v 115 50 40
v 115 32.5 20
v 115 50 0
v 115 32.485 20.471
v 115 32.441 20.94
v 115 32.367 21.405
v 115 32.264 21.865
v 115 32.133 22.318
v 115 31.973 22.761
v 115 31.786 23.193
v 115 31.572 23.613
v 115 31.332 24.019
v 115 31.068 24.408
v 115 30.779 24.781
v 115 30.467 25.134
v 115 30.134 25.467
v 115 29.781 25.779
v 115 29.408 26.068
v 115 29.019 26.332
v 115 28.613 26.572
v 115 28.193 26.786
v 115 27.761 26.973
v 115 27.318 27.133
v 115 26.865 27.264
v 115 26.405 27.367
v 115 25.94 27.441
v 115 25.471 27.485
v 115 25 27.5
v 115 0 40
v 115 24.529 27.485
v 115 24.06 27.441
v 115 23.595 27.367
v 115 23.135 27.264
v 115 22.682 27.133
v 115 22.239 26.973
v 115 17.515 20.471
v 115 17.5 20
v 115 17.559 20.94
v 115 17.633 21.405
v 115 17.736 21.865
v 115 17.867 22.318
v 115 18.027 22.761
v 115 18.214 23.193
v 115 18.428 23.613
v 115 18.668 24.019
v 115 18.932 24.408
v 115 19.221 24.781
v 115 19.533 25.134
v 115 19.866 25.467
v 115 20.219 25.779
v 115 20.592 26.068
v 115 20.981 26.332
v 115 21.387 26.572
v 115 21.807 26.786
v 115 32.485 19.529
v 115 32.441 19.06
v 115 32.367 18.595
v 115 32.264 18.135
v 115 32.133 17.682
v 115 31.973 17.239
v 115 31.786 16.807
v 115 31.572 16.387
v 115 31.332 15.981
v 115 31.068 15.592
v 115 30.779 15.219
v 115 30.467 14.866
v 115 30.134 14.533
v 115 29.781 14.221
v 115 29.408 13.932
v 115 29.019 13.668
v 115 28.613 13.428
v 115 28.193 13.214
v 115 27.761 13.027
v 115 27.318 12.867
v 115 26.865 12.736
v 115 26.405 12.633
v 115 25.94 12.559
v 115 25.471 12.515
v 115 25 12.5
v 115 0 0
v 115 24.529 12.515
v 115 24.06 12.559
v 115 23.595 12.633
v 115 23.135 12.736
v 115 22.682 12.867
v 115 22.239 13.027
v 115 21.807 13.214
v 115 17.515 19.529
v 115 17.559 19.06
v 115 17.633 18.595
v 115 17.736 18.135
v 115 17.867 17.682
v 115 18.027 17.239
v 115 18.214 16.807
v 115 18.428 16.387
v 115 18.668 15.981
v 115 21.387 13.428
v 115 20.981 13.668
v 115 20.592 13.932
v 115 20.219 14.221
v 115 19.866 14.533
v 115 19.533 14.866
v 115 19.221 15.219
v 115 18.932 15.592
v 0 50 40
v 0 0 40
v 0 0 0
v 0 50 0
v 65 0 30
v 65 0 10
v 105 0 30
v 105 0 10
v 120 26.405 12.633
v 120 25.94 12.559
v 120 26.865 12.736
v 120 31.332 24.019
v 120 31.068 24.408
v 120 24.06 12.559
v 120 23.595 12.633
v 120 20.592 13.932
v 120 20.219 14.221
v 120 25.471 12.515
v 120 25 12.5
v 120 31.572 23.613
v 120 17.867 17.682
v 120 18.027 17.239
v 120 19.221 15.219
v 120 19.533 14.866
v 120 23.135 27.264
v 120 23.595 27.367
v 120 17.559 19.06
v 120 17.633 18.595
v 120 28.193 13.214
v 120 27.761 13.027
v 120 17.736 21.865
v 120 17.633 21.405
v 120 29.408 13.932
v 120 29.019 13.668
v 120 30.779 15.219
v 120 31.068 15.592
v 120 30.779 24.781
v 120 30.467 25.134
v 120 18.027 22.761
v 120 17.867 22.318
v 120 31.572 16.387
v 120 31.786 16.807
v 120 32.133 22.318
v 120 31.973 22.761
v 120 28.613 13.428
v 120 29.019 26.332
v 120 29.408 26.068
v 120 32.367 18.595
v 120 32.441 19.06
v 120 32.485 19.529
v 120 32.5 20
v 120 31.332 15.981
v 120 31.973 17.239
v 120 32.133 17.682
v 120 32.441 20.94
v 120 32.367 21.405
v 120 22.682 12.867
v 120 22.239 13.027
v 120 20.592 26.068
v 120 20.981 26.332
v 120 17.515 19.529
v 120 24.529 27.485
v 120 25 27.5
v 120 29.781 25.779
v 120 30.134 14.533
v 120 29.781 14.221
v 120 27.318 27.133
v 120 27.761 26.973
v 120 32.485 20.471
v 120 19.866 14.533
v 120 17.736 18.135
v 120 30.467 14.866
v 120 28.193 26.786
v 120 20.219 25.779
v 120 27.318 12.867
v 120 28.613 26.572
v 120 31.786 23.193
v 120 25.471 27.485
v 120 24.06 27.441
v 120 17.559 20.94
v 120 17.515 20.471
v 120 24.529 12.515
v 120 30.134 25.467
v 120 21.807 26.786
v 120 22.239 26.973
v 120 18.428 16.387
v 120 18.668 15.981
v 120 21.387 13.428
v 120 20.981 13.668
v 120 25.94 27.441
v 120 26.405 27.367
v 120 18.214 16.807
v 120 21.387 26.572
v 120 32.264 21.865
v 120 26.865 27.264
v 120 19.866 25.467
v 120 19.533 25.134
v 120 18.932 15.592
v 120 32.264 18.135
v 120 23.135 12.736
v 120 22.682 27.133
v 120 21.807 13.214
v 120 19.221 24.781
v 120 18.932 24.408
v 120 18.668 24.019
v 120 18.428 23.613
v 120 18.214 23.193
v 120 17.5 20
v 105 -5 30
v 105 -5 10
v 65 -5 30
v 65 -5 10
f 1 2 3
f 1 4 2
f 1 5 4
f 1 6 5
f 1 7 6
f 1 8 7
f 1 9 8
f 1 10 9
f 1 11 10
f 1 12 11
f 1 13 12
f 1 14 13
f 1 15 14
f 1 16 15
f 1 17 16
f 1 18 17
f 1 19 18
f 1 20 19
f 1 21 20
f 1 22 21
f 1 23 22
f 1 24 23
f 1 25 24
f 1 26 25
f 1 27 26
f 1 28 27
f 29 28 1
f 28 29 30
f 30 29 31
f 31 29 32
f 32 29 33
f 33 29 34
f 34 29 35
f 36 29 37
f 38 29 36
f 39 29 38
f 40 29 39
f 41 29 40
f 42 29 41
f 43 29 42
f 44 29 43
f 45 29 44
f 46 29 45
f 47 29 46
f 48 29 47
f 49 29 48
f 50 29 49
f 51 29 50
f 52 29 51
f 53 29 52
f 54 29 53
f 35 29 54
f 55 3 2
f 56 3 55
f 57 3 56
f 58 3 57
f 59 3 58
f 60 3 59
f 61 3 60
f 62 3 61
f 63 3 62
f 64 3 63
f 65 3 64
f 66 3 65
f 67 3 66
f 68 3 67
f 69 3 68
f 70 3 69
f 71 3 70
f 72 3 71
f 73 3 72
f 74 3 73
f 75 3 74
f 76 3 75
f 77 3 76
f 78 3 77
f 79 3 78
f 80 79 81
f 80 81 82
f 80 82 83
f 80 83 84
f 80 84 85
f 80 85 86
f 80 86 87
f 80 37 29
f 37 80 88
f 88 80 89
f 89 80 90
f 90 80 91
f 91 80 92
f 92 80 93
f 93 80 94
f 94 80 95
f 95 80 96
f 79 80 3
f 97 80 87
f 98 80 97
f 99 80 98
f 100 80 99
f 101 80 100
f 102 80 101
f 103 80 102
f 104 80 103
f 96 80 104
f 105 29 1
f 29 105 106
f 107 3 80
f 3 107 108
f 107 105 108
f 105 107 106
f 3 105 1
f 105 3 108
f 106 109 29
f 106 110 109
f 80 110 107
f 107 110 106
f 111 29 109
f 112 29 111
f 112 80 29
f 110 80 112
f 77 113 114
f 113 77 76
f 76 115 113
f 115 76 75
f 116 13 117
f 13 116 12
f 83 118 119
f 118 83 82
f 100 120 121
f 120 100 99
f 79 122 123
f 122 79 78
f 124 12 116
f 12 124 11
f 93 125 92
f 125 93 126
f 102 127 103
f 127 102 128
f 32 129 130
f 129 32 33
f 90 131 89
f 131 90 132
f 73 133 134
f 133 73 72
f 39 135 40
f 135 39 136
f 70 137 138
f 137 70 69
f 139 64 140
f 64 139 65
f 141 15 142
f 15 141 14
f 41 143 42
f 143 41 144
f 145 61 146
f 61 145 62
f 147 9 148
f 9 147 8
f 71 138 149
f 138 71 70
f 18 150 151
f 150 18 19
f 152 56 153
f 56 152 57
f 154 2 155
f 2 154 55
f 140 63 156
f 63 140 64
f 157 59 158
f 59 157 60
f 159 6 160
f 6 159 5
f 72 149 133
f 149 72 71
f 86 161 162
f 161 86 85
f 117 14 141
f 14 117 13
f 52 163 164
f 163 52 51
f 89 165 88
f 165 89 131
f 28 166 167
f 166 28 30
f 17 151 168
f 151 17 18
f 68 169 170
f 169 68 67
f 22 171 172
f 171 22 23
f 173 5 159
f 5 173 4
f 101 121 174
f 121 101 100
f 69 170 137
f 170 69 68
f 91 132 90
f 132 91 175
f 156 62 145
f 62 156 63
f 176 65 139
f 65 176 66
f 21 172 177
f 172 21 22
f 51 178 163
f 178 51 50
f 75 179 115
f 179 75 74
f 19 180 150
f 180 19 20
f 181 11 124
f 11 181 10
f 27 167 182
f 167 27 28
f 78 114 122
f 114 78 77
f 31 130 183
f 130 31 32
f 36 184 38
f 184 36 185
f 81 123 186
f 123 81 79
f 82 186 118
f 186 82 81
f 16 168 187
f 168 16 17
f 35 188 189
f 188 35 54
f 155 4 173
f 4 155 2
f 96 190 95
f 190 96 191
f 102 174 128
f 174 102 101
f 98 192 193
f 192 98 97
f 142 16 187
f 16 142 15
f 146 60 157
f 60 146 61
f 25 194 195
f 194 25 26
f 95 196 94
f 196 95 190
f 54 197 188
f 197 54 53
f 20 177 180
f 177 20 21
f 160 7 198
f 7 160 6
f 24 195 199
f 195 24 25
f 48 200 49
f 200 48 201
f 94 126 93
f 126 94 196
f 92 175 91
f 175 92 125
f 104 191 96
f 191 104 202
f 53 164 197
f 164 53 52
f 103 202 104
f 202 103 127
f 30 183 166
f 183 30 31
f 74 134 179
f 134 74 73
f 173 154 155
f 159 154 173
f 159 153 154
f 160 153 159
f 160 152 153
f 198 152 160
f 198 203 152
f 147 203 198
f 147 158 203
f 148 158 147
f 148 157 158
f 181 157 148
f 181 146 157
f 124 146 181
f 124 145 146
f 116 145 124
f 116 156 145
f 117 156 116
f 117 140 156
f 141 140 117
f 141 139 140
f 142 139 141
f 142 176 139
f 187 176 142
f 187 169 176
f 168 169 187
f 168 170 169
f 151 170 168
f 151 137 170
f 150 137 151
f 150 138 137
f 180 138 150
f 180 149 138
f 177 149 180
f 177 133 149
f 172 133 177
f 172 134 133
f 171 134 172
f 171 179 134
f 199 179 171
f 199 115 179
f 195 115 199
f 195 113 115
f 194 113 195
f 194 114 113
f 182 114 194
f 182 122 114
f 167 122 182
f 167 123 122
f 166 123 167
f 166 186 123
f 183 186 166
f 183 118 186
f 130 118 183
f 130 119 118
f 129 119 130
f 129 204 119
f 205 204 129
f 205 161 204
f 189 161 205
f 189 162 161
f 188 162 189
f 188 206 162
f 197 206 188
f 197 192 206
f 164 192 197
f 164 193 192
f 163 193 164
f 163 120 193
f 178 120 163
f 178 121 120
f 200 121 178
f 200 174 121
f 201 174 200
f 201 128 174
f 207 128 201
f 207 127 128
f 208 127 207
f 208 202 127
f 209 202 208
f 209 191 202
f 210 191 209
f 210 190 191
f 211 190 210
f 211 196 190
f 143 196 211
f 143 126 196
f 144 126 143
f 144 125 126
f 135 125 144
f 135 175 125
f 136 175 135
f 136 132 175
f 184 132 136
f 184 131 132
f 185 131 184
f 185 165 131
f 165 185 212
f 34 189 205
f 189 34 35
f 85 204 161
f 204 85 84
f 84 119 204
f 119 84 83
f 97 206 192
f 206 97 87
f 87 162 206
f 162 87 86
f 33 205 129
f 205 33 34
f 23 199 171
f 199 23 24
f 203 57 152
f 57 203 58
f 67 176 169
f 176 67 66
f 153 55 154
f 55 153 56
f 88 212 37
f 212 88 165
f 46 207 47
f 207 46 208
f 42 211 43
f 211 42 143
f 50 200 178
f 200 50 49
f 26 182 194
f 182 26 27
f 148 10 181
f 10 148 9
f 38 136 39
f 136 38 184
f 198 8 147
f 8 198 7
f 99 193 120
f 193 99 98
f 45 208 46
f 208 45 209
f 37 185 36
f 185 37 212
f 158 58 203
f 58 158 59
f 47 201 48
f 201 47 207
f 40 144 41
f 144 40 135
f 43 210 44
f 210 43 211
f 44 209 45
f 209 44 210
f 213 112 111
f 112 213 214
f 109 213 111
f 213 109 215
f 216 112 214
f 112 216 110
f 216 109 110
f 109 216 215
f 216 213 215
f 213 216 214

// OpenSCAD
//PETG shrinkage
shrinkage = 1.00;

//wall width
width = 5;

//powersupply dimensions
psWidth = 115 * shrinkage;
psHeight = 50 * shrinkage;
psLength = (215 + 12) * shrinkage; //main case + terminal
psTerminalLength = 12 * shrinkage;
psSideScrewDepth = 32.5 * shrinkage;
psSideScrewOffset = 10 * shrinkage;
psSideScrewDifference = 25 * shrinkage;

//switch block and wire hole dimensions
switchWidth = 40 * shrinkage;
switchHeight = 20 * shrinkage;
switchDifferenceBottom = 10 * shrinkage;
switchDifferenceTop = 10 * shrinkage;
switchBlockWidth = psWidth;
switchDifferenceLeft = switchBlockWidth - 10 - switchWidth;
switchBlockLength = switchHeight + switchDifferenceBottom + switchDifferenceTop;
switchBlockHeight = psHeight;
wireHoleX = switchBlockWidth;
wireHoleY = switchBlockLength / 2;
wireHoleZ = switchBlockHeight / 2;
wireHoleDiameter = 15;
wireHoleHeight = width;




actualSleeveHeight = psHeight + width * 2;
actualSleeveWidth = psWidth + width * 2;
actualSleeveLength = width + psSideScrewOffset + psSideScrewDepth + psTerminalLength + switchHeight;

//bottom
module powersupply()
{
    color([1, 0, 0])
    //powersupply case
    cube([psWidth, psHeight, psLength]);

    //screw holes, 4 on each side
    color([0, 1, 0])
    for (x = [0:psWidth:psWidth])
    {
        translate([x, psHeight / 2, psTerminalLength + psSideScrewDepth])
        {
            for (z=[0:150:150])
            {
                translate([0, 0, z])
                {
                    for (y=[-1:2:1])
                    {
                        translate([0, y * (psSideScrewDifference / 2), 0])
                        {
                            rotate([0,x==0?-90:90, 0])
                            {
                                cylinder(d = 5, h = width, $fn = 100);
                            }
                        }
                    }
                }
            }
        }
    }
}

module switchBlock()
{
    cube([switchBlockWidth, switchBlockHeight, switchBlockLength]);

    translate([wireHoleX, wireHoleZ, wireHoleY])
    {
        rotate([0, 90, 0])
        {
            cylinder(d = wireHoleDiameter, h = width, $fn = 100);
        }
    }

    translate([switchDifferenceLeft , -width, switchDifferenceBottom])
    {
        cube([switchWidth, width, switchHeight]);
    }
}

module buildit()
{
    difference()
    {
        //sleeve
        cube([actualSleeveWidth, actualSleeveHeight, actualSleeveLength]);

        //powersupply
        translate([width, width, width + 25])
        {
            powersupply();
        }

        //switch block
        translate([width, width, width])
        {
            switchBlock();
        }
    }
}

switchBlock();
